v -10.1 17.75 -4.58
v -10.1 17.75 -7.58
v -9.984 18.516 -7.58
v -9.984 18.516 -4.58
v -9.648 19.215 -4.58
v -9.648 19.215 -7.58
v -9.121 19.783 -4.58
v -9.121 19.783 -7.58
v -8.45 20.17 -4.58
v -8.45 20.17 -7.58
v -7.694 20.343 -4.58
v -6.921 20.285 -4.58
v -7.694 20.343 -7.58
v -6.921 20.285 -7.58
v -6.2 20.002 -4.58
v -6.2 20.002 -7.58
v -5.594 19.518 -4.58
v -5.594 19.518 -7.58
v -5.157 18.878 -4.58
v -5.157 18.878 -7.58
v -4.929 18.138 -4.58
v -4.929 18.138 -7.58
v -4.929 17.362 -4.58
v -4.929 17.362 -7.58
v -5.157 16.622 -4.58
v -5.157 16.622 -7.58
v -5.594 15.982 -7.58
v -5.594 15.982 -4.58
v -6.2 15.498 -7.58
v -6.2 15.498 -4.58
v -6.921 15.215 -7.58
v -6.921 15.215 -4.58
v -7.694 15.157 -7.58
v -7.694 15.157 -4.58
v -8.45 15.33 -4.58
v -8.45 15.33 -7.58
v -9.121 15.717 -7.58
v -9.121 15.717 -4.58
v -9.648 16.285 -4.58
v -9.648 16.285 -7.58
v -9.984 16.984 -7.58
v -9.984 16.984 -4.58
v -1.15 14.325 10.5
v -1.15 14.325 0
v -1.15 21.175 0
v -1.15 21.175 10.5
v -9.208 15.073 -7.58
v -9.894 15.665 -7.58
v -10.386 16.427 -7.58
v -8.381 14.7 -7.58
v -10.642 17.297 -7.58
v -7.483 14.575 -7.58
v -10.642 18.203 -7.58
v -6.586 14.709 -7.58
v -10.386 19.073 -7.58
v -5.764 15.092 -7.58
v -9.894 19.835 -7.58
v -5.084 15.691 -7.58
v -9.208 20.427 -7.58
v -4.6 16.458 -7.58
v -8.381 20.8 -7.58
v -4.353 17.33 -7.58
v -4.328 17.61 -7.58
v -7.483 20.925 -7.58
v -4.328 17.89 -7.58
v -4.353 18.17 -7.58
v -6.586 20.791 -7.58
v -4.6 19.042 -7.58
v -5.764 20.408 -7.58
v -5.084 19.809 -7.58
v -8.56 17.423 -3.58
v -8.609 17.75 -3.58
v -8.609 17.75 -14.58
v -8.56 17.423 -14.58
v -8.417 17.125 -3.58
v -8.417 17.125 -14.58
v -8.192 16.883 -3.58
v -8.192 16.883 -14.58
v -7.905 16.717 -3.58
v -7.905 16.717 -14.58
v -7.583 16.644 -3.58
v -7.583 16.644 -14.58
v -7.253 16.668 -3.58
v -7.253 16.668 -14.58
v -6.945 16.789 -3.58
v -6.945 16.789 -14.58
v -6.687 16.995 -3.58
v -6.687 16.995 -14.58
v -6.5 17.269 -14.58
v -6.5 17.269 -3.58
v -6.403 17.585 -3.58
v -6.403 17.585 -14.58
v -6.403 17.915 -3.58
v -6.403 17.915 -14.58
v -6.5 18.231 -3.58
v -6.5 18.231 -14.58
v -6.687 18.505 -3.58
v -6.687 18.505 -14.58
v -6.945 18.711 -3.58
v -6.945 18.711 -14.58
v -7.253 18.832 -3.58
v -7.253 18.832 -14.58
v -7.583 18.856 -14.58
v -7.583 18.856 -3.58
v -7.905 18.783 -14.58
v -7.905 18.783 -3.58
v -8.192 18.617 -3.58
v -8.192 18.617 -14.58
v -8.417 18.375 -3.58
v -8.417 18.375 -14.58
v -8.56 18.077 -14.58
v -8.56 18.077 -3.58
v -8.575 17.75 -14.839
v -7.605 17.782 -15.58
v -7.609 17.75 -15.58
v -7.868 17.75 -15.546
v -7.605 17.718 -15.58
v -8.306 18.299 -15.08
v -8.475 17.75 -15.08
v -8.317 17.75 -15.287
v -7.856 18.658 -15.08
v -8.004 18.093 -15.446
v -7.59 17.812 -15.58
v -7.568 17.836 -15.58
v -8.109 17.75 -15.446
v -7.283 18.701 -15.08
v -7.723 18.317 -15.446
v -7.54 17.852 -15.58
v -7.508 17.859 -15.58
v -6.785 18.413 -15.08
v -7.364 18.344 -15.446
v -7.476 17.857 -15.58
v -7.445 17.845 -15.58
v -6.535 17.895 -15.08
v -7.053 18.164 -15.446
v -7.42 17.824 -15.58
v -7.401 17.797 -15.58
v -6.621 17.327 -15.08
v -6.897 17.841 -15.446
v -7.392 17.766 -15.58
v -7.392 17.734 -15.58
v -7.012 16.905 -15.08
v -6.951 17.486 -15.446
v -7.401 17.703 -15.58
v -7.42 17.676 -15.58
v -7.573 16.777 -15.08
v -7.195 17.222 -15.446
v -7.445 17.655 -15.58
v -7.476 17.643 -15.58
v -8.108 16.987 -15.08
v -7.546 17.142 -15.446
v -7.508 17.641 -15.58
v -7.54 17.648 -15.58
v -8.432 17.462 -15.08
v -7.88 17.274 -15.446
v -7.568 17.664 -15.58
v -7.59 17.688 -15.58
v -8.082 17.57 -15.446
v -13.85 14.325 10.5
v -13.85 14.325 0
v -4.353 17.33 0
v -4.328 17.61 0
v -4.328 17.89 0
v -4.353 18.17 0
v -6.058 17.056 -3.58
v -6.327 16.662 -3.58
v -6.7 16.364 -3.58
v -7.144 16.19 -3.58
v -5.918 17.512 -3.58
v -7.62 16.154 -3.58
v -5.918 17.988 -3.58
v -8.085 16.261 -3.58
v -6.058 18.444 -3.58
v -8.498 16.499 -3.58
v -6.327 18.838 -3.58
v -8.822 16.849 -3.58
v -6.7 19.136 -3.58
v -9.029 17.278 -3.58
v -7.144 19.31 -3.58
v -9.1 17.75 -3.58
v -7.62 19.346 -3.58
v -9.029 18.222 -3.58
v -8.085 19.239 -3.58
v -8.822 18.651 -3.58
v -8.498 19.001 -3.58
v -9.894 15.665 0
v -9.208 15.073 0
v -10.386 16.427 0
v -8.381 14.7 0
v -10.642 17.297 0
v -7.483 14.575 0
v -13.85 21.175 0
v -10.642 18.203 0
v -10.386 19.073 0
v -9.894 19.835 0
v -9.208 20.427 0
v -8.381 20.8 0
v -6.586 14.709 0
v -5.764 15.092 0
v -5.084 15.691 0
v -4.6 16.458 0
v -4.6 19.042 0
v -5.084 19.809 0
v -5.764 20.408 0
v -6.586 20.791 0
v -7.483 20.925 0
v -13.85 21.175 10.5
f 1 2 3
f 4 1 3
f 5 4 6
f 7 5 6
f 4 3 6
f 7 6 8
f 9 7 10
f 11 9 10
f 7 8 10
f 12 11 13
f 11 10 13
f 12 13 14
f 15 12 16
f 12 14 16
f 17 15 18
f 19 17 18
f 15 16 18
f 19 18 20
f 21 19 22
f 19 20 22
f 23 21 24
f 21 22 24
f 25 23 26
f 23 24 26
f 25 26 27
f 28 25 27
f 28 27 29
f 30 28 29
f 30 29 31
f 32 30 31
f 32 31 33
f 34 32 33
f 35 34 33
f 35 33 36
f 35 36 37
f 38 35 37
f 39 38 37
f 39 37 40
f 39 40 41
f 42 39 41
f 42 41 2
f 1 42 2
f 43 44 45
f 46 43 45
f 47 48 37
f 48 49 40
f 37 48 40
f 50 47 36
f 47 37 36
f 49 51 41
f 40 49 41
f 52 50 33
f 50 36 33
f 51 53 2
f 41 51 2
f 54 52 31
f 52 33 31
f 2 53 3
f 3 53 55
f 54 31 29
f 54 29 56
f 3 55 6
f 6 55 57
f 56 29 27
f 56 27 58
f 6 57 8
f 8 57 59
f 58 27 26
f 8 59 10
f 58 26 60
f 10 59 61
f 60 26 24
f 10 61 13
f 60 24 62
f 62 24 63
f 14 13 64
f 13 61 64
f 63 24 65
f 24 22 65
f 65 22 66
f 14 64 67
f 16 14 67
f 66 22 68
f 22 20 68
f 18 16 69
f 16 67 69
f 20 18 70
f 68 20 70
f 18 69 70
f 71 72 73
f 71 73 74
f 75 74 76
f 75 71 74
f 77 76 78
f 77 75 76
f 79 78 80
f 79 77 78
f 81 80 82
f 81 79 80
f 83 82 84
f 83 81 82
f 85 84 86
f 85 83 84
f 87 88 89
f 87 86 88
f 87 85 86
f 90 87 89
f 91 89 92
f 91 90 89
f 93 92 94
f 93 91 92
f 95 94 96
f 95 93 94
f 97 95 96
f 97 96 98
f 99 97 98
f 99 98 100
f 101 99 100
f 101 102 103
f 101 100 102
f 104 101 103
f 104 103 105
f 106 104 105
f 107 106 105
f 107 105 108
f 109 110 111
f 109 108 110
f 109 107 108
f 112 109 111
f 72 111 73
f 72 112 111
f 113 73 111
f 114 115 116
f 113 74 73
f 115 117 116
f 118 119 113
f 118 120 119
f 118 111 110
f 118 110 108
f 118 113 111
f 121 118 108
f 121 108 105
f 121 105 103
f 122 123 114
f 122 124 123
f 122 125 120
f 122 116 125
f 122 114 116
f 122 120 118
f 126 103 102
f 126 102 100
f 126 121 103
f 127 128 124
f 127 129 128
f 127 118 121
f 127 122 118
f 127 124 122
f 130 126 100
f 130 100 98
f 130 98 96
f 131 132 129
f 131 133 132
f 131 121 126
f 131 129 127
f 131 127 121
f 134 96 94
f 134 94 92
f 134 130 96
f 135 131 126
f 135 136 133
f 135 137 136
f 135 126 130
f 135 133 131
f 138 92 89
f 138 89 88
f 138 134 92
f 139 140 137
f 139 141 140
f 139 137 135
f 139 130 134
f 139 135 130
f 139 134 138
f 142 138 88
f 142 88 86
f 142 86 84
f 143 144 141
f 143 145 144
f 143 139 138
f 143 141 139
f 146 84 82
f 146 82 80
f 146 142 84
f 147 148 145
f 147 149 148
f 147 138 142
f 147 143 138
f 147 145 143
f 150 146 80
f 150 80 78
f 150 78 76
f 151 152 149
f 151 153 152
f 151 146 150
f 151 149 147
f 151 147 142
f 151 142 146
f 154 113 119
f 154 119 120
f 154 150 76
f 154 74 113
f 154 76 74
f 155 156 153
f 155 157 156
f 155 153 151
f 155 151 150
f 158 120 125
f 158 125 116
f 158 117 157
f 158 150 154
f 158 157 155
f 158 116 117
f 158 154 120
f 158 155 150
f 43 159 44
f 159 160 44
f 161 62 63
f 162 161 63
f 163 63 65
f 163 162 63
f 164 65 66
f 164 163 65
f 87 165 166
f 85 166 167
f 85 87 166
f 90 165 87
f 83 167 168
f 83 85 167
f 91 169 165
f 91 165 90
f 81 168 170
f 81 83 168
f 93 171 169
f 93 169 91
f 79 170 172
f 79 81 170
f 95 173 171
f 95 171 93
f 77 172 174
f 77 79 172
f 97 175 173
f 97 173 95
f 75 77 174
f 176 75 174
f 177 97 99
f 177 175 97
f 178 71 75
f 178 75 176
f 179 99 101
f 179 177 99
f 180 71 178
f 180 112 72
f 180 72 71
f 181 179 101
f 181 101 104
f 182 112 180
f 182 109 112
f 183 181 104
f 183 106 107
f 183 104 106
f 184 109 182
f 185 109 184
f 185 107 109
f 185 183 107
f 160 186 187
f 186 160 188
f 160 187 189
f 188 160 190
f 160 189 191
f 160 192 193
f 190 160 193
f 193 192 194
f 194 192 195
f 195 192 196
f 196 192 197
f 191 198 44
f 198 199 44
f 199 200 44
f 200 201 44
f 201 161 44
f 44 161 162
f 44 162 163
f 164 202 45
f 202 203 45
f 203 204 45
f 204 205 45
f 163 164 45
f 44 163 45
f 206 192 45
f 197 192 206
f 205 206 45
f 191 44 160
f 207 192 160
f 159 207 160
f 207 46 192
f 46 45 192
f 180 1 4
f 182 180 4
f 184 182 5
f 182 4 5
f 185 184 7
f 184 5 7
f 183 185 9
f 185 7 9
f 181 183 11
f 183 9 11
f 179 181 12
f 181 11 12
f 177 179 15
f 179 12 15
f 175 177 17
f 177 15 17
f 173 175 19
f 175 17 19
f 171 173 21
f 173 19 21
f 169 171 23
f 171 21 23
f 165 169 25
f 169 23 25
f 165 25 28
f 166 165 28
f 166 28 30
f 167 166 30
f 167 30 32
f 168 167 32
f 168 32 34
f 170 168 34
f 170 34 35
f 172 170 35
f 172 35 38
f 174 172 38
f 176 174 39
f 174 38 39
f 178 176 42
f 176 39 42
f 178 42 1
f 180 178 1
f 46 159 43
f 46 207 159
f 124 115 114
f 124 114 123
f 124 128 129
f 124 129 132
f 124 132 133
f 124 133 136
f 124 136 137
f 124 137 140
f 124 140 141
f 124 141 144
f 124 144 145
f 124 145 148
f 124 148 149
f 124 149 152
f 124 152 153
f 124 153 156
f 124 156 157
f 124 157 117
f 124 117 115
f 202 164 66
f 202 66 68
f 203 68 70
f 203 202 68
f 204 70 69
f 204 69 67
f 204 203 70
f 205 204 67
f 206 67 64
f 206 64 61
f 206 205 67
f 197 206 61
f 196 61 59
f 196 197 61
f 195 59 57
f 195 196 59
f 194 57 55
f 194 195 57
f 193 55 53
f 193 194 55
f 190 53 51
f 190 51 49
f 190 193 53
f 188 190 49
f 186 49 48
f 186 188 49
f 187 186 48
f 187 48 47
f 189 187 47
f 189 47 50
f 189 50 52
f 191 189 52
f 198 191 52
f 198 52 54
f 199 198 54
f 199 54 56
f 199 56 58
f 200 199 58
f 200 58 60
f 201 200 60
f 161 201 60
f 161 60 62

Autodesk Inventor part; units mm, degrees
ref_plane "YZ Plane" through (0, 0, 0) normal (1, 0, 0) x (0, 1, 0)
ref_plane "XZ Plane" through (0, 0, 0) normal (0, 1, 0) x (-1, 0, 0)
ref_plane "XY Plane" through (0, 0, 0) normal (0, 0, 1) x (1, 0, 0)
ref_plane "Work Plane1" through (0, 0, 0) normal (0, 0, 1) x (1, 0, 0)
sketch "Sketch1" plane through (0, 0, 0) normal (0, 0, 1) x (1, 0, 0)
  arc A0 (-4.3529, 18.17) -> (-4.3529, 17.33) centre (-7.5, 17.75) ccw projected
  circle A1 centre (-7.5, 17.75) radius 3.175
  point P0 (0, 0)
  dimension "d0" = 6.35
extrude "Extrusion1" add sketch "Sketch1" against normal blind 7.58
sketch "Sketch2" plane through (-7.5, 17.75, 0) normal (0, 0, 1) x (1, 0, 0)
  line L0 (-6.35, -3.425) -> (6.35, -3.425)
  line L1 (6.35, -3.425) -> (6.35, 3.425)
  line L2 (6.35, 3.425) -> (-6.35, 3.425)
  line L3 (-6.35, 3.425) -> (-6.35, -3.425)
  line L4 (-6.35, -3.425) -> (6.35, 3.425) construction
  line L5 (6.35, -3.425) -> (-6.35, 3.425) construction
  point P0 (7.5, -17.75)
  point P1 (0, 0)
  dimension "d3" = 12.7
  dimension "d4" = 6.85
extrude "Extrusion2" add sketch "Sketch2" along normal blind 10.5
sketch "Sketch3" plane through (-7.5, 17.75, -7.58) normal (0, 0, -1) x (-1, 0, 0)
  circle A0 centre (0, 0) radius 2.6
  point P0 (-7.5, -17.75)
  dimension "d7" = 5.2
extrude "Extrusion3" cut sketch "Sketch3" against normal blind 4
sketch "Sketch4" plane through (-7.5, 17.75, -3.58) normal (0, 0, -1) x (-1, 0, 0)
  circle A0 centre (0, 0) radius 1.1094
  point P0 (-7.5, -17.75)
extrude "Extrusion4" add sketch "Sketch4" along normal blind 12
fillet "Fillet1" radius 1 1 edges at (-6.3906, 17.75, -15.58)
thread "Thread1" size "M7x0.75" class "6g" standard "ISO Metric profile" length 15.103
chamfer "Chamfer1" distance 1 angle 45 1 edges at (-4.9, 17.75, -3.58)
properties part number "AST13SEBQ"
